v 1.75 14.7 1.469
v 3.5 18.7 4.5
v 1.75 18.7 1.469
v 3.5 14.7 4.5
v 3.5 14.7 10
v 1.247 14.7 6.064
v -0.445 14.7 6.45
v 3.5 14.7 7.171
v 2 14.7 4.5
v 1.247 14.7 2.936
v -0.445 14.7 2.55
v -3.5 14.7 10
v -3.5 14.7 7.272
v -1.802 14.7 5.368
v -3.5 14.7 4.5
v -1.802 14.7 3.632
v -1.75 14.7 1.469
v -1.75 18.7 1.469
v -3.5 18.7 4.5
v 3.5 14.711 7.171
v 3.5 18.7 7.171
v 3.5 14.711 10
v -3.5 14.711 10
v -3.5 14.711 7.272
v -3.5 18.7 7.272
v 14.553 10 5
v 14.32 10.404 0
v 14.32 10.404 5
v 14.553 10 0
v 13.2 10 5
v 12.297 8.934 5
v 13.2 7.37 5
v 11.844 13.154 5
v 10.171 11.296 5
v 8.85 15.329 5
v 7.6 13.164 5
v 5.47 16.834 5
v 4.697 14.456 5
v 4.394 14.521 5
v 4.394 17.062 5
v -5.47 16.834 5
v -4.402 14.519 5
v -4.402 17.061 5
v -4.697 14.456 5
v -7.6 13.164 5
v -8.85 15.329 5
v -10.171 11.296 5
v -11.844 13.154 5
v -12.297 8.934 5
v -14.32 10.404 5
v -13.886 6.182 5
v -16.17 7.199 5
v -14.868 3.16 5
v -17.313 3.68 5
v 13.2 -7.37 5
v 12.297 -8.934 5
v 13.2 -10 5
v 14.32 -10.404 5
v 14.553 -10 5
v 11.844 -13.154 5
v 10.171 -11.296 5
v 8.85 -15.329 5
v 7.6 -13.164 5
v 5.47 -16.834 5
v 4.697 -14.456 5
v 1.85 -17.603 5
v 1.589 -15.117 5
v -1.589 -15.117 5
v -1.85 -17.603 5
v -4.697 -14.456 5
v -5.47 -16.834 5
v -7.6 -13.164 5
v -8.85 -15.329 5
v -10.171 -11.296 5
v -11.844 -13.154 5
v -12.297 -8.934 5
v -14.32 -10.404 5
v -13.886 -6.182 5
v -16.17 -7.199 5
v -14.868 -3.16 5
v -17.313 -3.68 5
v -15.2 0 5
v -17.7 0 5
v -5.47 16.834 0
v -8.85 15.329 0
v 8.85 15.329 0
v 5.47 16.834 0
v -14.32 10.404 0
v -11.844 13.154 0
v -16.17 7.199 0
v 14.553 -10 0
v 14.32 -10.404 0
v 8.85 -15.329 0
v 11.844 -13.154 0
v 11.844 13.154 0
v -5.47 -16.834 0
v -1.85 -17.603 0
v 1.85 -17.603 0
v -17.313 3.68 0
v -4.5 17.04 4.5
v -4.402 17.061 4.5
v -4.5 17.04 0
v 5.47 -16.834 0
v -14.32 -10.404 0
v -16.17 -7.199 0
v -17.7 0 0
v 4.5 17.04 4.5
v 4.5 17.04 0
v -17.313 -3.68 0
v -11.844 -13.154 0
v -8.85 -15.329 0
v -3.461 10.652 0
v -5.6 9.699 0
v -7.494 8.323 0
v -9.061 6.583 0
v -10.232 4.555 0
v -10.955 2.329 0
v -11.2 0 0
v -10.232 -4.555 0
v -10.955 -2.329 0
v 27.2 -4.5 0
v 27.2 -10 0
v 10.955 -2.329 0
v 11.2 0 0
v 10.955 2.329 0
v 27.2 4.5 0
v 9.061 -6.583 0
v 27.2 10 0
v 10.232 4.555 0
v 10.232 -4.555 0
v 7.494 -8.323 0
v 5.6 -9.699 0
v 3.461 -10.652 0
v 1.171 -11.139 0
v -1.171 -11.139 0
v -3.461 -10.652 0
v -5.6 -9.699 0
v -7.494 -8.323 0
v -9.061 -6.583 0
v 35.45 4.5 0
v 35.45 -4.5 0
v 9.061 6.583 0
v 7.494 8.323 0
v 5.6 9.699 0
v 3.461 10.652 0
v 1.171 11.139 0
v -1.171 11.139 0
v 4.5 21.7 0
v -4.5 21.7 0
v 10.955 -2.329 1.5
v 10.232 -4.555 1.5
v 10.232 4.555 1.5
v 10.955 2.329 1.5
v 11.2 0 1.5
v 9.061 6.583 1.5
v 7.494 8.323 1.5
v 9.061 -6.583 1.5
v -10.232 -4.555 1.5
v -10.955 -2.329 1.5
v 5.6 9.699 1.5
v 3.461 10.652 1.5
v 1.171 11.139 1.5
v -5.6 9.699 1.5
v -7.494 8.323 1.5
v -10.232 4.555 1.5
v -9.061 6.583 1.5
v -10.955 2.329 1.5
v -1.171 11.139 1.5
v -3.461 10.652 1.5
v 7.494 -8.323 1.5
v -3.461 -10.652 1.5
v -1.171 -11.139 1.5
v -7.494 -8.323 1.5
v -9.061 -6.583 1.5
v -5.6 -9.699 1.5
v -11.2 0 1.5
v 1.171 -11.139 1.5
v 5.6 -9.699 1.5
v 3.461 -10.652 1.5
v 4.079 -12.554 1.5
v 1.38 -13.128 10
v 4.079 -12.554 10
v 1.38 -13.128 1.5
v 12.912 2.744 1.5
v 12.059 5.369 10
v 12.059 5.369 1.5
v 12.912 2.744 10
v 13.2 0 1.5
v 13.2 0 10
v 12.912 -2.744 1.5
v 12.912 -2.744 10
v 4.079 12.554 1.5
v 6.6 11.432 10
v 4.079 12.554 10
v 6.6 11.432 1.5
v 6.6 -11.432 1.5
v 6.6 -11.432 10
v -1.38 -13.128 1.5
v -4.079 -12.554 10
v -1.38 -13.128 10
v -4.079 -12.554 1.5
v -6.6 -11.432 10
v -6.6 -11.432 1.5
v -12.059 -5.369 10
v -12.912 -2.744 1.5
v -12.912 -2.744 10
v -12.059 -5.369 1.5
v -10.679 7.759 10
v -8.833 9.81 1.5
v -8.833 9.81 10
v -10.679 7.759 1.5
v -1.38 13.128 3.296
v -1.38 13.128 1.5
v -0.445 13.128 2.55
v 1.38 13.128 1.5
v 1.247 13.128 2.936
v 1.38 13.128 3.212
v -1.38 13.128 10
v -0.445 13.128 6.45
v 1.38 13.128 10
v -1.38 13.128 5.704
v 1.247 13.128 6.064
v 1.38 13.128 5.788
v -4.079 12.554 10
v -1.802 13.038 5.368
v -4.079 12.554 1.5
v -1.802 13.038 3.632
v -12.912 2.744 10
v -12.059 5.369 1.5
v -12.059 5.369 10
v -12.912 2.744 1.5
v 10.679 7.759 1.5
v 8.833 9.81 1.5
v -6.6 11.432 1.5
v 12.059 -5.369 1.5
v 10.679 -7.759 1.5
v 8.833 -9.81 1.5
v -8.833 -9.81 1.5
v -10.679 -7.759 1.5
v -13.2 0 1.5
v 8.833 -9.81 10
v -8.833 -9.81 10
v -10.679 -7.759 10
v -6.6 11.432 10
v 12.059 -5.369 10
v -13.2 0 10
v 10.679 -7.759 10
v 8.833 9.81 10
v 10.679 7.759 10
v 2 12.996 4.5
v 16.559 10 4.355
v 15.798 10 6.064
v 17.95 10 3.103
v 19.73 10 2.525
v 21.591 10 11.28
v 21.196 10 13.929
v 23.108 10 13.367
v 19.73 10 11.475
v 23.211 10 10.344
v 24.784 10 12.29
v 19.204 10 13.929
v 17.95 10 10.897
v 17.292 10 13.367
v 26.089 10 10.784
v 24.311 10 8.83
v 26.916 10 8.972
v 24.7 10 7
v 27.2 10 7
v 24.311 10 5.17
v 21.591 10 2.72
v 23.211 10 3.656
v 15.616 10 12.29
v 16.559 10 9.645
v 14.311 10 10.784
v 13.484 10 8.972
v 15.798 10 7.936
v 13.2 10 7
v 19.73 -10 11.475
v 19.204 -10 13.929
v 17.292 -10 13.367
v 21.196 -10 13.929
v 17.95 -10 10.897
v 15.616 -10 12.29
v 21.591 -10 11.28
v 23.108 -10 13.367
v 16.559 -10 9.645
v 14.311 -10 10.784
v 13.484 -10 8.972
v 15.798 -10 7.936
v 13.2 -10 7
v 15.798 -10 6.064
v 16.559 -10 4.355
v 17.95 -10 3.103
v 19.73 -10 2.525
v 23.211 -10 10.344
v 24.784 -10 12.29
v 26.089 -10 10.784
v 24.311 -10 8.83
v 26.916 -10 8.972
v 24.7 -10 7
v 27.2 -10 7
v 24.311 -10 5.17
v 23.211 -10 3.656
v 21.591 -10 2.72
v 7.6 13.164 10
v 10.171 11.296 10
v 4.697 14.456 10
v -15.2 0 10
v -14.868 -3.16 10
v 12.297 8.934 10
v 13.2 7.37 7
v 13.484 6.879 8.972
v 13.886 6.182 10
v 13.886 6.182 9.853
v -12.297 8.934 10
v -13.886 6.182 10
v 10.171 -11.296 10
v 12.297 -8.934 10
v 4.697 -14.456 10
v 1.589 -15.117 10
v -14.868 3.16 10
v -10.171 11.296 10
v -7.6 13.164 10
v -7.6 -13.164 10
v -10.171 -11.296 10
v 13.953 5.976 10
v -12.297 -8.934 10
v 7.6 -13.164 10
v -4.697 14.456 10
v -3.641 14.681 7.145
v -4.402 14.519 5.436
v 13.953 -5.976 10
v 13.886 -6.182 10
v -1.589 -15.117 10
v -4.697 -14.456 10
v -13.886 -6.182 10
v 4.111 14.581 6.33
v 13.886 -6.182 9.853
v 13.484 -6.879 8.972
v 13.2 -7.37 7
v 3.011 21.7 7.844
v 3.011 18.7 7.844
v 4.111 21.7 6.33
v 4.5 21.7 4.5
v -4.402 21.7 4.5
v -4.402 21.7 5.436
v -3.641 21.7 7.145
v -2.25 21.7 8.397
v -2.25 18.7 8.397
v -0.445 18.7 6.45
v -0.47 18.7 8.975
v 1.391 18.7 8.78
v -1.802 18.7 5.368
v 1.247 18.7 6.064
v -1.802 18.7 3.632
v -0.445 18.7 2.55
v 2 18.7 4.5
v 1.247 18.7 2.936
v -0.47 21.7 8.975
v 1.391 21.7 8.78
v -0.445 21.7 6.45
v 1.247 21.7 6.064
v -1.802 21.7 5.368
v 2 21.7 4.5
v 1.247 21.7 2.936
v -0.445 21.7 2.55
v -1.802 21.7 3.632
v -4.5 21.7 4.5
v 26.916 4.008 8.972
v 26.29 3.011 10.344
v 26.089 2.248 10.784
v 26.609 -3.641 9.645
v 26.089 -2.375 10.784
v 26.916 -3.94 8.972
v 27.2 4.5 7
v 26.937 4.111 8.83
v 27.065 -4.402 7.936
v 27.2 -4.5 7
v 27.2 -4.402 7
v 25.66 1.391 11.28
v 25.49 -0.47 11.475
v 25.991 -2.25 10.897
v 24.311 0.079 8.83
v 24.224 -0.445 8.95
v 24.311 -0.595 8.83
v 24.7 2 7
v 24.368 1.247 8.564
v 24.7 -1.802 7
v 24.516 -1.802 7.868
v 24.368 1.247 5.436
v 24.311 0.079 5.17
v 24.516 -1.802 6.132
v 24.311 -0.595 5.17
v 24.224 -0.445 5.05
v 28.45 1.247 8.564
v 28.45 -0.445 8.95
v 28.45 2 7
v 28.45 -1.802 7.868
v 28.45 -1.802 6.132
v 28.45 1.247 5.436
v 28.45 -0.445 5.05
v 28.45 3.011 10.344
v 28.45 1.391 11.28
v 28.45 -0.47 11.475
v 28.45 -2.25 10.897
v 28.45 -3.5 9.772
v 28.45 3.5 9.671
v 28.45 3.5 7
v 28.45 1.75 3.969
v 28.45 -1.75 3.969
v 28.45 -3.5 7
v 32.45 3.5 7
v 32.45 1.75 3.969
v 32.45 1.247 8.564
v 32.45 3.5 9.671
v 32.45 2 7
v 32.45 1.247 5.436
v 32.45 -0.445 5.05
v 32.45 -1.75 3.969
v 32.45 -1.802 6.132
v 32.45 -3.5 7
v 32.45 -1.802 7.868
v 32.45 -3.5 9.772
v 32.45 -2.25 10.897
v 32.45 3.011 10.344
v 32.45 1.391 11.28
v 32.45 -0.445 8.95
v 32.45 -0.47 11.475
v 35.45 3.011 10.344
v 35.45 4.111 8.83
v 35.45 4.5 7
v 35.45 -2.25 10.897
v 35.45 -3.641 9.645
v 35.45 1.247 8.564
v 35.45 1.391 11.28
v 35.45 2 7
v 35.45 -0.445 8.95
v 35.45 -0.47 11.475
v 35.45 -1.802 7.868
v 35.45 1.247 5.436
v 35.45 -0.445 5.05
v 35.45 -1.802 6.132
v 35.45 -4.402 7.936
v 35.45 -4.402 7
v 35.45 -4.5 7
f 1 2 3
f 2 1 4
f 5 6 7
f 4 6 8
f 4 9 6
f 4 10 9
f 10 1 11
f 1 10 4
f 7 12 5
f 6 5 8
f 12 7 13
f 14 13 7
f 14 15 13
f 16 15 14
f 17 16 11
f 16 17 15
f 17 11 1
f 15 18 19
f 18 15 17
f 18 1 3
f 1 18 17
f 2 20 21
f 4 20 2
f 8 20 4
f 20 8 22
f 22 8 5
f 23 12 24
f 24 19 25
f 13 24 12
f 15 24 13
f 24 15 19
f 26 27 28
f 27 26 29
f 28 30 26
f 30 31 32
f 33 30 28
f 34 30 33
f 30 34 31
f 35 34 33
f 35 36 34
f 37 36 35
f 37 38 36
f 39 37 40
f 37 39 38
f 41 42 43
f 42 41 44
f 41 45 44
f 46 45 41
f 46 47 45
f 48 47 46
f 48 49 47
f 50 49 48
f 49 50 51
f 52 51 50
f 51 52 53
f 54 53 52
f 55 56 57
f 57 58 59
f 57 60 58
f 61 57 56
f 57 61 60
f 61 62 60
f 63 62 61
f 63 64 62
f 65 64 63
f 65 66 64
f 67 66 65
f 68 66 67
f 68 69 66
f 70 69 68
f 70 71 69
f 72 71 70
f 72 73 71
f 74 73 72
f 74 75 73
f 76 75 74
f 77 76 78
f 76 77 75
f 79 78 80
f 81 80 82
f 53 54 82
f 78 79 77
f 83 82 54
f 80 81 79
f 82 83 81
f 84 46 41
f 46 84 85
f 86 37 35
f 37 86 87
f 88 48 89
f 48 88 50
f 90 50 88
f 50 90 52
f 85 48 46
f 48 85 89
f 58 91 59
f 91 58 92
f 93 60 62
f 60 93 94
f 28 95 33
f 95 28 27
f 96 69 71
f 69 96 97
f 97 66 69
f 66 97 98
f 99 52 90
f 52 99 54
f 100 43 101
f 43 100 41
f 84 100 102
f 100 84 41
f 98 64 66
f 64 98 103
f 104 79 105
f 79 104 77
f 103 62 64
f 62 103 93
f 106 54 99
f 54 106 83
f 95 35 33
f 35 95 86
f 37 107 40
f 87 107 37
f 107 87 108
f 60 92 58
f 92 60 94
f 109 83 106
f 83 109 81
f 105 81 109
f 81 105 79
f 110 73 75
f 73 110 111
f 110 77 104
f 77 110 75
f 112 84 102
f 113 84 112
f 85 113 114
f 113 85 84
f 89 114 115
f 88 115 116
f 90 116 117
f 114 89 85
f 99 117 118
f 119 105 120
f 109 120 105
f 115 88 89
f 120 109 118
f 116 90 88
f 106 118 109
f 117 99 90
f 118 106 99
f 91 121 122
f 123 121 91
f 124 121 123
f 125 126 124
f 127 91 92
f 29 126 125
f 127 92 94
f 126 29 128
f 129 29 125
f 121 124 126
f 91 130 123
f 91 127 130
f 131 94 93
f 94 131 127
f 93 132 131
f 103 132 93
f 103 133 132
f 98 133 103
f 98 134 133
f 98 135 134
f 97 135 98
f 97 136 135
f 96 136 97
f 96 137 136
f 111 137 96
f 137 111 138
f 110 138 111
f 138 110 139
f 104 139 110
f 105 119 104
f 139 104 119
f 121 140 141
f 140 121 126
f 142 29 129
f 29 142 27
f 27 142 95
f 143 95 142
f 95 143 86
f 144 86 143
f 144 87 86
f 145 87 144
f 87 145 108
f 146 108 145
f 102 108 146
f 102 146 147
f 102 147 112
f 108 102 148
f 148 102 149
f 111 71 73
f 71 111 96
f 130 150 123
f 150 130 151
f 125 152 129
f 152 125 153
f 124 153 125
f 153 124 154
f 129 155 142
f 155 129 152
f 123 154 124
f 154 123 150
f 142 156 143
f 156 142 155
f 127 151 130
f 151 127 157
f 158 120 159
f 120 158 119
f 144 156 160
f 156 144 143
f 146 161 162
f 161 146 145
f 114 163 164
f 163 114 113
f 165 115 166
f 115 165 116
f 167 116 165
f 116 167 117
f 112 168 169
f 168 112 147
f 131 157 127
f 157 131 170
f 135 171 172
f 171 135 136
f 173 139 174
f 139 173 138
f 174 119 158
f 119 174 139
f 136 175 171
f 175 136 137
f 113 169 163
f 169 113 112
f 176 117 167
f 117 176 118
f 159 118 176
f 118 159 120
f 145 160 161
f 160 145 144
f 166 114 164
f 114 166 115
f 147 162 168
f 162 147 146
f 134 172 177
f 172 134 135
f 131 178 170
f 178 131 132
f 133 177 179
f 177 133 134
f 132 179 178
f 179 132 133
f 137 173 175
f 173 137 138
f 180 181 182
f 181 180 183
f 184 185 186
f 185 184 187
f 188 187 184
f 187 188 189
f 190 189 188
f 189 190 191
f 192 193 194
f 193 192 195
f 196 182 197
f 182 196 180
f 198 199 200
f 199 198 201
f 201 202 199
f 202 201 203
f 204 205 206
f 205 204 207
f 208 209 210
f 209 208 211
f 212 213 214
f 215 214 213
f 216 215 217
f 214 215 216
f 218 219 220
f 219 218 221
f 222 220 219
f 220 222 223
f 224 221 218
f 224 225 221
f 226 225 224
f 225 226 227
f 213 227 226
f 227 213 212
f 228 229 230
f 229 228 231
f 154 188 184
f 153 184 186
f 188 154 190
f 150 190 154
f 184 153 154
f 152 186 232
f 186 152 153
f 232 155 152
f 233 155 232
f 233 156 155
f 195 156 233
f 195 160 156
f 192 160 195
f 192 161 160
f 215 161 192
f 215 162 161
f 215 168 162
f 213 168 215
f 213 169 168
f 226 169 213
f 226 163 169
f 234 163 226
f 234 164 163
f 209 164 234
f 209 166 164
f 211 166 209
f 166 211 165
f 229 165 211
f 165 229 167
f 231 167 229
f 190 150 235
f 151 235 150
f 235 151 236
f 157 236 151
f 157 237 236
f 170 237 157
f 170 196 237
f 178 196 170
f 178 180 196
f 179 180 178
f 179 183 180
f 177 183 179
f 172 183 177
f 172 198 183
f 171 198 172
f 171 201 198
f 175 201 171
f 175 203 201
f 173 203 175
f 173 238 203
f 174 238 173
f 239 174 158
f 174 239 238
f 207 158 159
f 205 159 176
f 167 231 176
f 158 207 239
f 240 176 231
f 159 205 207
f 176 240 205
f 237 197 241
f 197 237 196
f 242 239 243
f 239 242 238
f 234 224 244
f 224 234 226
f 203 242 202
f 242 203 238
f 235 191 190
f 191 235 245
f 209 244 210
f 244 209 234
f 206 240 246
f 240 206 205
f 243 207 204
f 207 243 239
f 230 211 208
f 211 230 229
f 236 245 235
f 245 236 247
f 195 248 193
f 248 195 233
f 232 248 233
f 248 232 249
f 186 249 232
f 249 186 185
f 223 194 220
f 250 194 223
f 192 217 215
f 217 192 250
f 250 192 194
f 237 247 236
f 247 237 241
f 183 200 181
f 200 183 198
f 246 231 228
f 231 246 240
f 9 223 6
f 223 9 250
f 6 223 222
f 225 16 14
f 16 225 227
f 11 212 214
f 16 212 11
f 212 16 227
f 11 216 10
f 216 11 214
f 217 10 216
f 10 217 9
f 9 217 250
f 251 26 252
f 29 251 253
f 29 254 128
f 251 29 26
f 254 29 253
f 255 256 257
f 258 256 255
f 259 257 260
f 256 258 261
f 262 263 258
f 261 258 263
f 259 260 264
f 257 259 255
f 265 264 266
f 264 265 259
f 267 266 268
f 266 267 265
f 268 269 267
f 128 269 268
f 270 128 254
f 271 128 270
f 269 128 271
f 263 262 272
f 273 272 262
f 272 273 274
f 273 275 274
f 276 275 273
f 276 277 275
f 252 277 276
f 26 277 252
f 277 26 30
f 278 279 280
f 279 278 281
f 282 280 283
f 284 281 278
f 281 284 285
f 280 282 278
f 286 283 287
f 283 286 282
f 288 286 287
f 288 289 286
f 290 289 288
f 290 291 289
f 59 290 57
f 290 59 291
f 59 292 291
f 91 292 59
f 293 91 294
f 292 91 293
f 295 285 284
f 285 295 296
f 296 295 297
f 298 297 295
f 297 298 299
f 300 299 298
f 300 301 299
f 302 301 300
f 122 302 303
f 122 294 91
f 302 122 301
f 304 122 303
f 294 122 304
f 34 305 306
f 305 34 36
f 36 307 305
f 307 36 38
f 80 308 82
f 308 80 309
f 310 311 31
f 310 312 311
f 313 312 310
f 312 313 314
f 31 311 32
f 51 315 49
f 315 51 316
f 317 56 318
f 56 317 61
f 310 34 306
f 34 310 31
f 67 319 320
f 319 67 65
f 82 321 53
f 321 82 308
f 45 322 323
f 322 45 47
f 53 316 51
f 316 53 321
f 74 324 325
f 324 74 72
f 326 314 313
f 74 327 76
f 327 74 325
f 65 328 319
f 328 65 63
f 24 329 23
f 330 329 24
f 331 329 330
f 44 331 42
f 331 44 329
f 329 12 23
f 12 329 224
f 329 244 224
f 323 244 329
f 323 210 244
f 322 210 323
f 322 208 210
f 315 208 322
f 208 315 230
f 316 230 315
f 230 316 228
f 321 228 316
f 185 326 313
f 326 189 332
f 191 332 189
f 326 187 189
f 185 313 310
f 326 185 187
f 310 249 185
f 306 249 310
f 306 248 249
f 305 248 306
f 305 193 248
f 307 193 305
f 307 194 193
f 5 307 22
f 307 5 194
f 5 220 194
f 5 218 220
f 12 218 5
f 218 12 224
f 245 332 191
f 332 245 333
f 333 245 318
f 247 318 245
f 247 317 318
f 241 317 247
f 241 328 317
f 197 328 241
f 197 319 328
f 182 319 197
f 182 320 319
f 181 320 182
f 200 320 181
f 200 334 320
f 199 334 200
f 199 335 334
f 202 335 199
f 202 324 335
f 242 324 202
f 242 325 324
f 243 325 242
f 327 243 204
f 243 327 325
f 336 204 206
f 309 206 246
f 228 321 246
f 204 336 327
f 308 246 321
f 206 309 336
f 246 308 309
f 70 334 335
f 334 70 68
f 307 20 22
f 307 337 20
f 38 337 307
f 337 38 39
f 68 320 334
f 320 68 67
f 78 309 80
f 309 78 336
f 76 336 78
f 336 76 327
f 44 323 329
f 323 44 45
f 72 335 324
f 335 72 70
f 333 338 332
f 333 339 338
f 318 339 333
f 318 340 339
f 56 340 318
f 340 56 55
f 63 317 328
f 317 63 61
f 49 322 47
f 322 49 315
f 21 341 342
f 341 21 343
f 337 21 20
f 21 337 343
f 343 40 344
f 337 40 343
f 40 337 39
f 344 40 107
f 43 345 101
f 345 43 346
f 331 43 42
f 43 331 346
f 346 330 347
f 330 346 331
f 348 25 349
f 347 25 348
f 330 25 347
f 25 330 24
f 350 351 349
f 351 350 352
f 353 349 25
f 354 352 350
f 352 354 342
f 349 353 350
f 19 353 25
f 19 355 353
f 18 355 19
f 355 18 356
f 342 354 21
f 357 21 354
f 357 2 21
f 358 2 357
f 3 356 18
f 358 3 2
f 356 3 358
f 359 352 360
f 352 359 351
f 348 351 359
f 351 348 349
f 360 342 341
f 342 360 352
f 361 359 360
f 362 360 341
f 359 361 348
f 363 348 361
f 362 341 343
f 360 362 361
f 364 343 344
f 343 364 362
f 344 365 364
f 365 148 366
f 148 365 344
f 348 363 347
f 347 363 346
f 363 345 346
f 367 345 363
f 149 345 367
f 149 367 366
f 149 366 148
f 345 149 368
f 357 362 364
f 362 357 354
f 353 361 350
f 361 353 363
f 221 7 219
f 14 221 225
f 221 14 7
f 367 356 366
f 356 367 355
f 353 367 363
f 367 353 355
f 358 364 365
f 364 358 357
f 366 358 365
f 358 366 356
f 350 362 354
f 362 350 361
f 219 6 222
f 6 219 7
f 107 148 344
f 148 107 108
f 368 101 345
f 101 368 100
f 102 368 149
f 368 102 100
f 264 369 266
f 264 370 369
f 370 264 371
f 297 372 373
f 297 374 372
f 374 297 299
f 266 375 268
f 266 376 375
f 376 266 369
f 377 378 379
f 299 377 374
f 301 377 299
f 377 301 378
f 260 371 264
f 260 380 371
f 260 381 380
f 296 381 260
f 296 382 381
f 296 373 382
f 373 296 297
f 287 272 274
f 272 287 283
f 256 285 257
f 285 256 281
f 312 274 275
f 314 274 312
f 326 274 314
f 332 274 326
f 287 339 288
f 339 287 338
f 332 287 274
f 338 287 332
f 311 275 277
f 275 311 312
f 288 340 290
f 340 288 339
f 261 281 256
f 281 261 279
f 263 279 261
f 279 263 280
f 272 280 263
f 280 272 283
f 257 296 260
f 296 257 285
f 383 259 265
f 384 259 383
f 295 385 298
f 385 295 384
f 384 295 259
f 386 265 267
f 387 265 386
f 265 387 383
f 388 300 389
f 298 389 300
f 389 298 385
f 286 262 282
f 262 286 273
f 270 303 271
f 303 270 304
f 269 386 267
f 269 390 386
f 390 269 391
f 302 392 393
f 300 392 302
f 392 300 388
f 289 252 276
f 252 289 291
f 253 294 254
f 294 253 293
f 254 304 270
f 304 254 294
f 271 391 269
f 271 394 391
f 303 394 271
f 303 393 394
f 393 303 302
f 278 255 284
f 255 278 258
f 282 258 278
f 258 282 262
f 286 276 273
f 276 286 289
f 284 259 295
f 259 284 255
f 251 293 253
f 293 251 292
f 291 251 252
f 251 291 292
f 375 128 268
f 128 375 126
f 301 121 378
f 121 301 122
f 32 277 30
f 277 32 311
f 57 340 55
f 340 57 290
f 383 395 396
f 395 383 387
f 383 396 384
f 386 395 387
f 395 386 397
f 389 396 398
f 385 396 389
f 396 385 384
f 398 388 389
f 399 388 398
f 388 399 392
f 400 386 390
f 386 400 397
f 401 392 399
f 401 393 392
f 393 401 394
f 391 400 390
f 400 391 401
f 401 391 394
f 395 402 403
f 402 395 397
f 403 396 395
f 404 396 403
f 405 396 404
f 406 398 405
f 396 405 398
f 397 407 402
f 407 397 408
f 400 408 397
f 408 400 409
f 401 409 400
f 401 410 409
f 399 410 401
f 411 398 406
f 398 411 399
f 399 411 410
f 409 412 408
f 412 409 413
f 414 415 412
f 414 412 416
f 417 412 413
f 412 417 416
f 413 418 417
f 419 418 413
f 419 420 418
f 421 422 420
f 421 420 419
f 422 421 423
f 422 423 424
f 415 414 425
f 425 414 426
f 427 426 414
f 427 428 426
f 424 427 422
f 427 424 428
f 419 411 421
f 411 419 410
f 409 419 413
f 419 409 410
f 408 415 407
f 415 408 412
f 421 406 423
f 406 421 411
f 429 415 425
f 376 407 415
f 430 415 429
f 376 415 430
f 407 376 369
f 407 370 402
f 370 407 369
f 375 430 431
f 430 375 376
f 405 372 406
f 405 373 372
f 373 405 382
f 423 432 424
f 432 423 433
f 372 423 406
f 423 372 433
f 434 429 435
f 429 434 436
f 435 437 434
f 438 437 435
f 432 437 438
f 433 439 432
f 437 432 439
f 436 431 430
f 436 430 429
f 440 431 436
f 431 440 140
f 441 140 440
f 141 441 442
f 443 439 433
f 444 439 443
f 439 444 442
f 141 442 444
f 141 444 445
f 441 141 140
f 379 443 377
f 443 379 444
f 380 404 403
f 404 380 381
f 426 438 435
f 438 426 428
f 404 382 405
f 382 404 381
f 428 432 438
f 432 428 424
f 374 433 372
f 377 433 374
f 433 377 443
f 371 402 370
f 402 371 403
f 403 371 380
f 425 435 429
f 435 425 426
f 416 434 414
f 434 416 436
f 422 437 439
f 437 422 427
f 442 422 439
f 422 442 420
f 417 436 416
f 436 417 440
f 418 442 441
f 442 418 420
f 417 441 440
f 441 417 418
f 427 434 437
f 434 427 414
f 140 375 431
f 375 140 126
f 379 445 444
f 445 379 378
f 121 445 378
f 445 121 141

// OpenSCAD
// [FL_INDEX: keywords="openscad, 3d_parametric, Customizable_Lens_Holder, csg_solid" | COT="Parametric OpenSCAD design from 3DCodeverse"]
// Title: Customizable Lens Holder

//Customizable Open-source lens holder
// This is a cleaned up version of http://www.thingiverse.com/thing:26752

//CUSTOMIZER VARIABLES
//Defines the Diameter of the Lens 
Lens_Diameter=25.4; //Numeric value 

//Defines the Lens holder Thickness
Lens_Holder_Thickness=10;   //Numeric value 

//Defines the Lens Holder Lip Size
Lens_Holder_Lip_Size=3;     //Numeric value smaller than y

//Defines the Base Diameter
Base_Diameter=25; //Numeric value 

//Defines the Base Height
Base_Height=25;  //Numeric value 

//Defines the Guide Rod Length
Guide_Rod_Length=20; //Numeric value 

//Defines the Guide Rod Diameter
Guide_Rod_Diameter=8; //[2:12]

//Defines the Set Screw Diameter
Set_Screw_Diameter=3; //[2:10]

//Defines the Set Screw Nut Diameter
Set_Screw_Nut_Diameter=6; //[4:20]

//Defines the Set Screw Nut Thickness
Set_Screw_Nut_Thickness=3; //[2:10]





//CUSTOMIZER VARIABLES END


// ignore variable values
//Defines the Diameter of the Lens 
x=Lens_Diameter; //Numeric value 

//Defines the Lens holder Thickness
y=Lens_Holder_Thickness;   //Numeric value 

//Defines the Lens Holder Lip Size
z=Lens_Holder_Lip_Size;     //Numeric value smaller than y

//Defines the Base Diameter
X=Base_Diameter; //Numeric value 

//Defines the Base Height
Y=Base_Height;  //Numeric value 

//Defines the Guide Rod Length
e=Guide_Rod_Length; //Numeric value 

//Defines the Guide Rod Diameter
d=Guide_Rod_Diameter; //[2:12]

//Defines the Set Screw Diameter
a=Set_Screw_Diameter; //[2:10]

//Defines the Set Screw Nut Diameter
b=Set_Screw_Nut_Diameter; //[4:20]

//Defines the Set Screw Nut Thickness
c=Set_Screw_Nut_Thickness; //[2:10]


lens_holder();

module lens_holder(){
difference(){
cylinder(y/2,(x+10)/2,(x+10)/2);
cylinder((y+2)/2,(x-3)/2,(x-3)/2);
translate([0,0,1.5])cylinder((y+2)/2,(x+1)/2,(x+1)/2);
translate([0,(x+10)/2+5,(b+3)/2])rotate([90,0,0])cylinder(10,(a+1)/2,(a+1)/2);
translate([0,(x+8)/2,(b+3)/2])nuttrap();
translate([(x+15)/2,e/2,(d+6)/2])rotate([90,0,0])cylinder(e,(d+6)/2, (d+6)/2);
}
difference(){
translate([0,0,y/2])cylinder((y)/2,(x+5)/2,(x+5)/2);
cylinder((y)*2,(x+1)/2,(x+1)/2);
translate([0,(x+10)/2+5,(b+3)/2])rotate([90,0,0])cylinder(25,(b+3)/2,(b+3)/2);
translate([0,(x+8)/2,(b+3)/2])nuttrap();
}
difference(){
translate([0,(x+8)/2,0])set_screw((b+3)/2);
cylinder((y+2),(x+1)/2,(x+1)/2);
}
difference(){
translate([(x+15)/2,0,0])guide_rod();
rotate([0,0,90]){
#translate([0,((x+7)/-2)-((d)),(d+6)/2])rotate([90,0,0])cylinder(50,(a+1)/2,(a+1)/2);
translate([((x+7.5)/2)+((d+6)),0,0])rotate([0,0,90])set_screw1((d+6)/2);
}
}
translate([((x+7.5)/2)+((d+6)),0,0])rotate([0,0,90])set_screw((d+6)/2);
}

module guide_rod(){
difference(){
translate([0,e/2,(d+6)/2])rotate([90,0,0])cylinder(e,(d+6)/2, (d+6)/2);
translate([0,(e/2)+1,(d+6)/2])rotate([90,0,0])cylinder(e+2,(d+1)/2, (d+1)/2);
}
difference(){
translate([0,0,(d+6)/4])cube([(d+6),e,(d+6)/2], center = true);
translate([0,(e/2)+1,(d+6)/2])rotate([90,0,0])cylinder(e+2,(d+1)/2, (d+1)/2);
}
}

module set_screw(h){
difference(){
translate([0,5,h])rotate([90,0,0])cylinder(10,(b+3)/2, (b+3)/2);
#translate([0,10,h])rotate([90,0,0])cylinder(200,(a+1)/2, (a+1)/2);
translate([0,0,h])nuttrap();
}
difference(){
translate([0,0,h/2])cube([(b+3),10,h], center = true);
translate([0,6,h])rotate([90,0,0])cylinder(12,(a+1)/2, (a+1)/2);
translate([0,0,h])nuttrap();
}
}
module set_screw1(h){
translate([0,5,h])rotate([90,0,0])cylinder(10,(b+3)/2, (b+3)/2);
translate([0,0,h/2])cube([(b+3),10,h], center = true);

}

module nuttrap(){
translate([0,(c+1)/2,0])rotate([90,0,0])hexagon(c+1,(b+1)/2);
translate([0,0,(b*3)/2])cube([b+1,c+1,b*3],center = true);
}

module reg_polygon(sides,radius)
{
  function dia(r) = sqrt(pow(r*2,2)/2);  //sqrt((r*2^2)/2) if only we had an exponention op
  if(sides<2) square([radius,0]);
  if(sides==3) triangle(radius);
  if(sides==4) square([dia(radius),dia(radius)],center=true);
  if(sides>4) circle(r=radius,$fn=sides);
}

module hexagonf(radius)
{
  reg_polygon(6,radius);
}

module hexagon(height,radius) 
{
  linear_extrude(height=height) hexagonf(radius);
}
